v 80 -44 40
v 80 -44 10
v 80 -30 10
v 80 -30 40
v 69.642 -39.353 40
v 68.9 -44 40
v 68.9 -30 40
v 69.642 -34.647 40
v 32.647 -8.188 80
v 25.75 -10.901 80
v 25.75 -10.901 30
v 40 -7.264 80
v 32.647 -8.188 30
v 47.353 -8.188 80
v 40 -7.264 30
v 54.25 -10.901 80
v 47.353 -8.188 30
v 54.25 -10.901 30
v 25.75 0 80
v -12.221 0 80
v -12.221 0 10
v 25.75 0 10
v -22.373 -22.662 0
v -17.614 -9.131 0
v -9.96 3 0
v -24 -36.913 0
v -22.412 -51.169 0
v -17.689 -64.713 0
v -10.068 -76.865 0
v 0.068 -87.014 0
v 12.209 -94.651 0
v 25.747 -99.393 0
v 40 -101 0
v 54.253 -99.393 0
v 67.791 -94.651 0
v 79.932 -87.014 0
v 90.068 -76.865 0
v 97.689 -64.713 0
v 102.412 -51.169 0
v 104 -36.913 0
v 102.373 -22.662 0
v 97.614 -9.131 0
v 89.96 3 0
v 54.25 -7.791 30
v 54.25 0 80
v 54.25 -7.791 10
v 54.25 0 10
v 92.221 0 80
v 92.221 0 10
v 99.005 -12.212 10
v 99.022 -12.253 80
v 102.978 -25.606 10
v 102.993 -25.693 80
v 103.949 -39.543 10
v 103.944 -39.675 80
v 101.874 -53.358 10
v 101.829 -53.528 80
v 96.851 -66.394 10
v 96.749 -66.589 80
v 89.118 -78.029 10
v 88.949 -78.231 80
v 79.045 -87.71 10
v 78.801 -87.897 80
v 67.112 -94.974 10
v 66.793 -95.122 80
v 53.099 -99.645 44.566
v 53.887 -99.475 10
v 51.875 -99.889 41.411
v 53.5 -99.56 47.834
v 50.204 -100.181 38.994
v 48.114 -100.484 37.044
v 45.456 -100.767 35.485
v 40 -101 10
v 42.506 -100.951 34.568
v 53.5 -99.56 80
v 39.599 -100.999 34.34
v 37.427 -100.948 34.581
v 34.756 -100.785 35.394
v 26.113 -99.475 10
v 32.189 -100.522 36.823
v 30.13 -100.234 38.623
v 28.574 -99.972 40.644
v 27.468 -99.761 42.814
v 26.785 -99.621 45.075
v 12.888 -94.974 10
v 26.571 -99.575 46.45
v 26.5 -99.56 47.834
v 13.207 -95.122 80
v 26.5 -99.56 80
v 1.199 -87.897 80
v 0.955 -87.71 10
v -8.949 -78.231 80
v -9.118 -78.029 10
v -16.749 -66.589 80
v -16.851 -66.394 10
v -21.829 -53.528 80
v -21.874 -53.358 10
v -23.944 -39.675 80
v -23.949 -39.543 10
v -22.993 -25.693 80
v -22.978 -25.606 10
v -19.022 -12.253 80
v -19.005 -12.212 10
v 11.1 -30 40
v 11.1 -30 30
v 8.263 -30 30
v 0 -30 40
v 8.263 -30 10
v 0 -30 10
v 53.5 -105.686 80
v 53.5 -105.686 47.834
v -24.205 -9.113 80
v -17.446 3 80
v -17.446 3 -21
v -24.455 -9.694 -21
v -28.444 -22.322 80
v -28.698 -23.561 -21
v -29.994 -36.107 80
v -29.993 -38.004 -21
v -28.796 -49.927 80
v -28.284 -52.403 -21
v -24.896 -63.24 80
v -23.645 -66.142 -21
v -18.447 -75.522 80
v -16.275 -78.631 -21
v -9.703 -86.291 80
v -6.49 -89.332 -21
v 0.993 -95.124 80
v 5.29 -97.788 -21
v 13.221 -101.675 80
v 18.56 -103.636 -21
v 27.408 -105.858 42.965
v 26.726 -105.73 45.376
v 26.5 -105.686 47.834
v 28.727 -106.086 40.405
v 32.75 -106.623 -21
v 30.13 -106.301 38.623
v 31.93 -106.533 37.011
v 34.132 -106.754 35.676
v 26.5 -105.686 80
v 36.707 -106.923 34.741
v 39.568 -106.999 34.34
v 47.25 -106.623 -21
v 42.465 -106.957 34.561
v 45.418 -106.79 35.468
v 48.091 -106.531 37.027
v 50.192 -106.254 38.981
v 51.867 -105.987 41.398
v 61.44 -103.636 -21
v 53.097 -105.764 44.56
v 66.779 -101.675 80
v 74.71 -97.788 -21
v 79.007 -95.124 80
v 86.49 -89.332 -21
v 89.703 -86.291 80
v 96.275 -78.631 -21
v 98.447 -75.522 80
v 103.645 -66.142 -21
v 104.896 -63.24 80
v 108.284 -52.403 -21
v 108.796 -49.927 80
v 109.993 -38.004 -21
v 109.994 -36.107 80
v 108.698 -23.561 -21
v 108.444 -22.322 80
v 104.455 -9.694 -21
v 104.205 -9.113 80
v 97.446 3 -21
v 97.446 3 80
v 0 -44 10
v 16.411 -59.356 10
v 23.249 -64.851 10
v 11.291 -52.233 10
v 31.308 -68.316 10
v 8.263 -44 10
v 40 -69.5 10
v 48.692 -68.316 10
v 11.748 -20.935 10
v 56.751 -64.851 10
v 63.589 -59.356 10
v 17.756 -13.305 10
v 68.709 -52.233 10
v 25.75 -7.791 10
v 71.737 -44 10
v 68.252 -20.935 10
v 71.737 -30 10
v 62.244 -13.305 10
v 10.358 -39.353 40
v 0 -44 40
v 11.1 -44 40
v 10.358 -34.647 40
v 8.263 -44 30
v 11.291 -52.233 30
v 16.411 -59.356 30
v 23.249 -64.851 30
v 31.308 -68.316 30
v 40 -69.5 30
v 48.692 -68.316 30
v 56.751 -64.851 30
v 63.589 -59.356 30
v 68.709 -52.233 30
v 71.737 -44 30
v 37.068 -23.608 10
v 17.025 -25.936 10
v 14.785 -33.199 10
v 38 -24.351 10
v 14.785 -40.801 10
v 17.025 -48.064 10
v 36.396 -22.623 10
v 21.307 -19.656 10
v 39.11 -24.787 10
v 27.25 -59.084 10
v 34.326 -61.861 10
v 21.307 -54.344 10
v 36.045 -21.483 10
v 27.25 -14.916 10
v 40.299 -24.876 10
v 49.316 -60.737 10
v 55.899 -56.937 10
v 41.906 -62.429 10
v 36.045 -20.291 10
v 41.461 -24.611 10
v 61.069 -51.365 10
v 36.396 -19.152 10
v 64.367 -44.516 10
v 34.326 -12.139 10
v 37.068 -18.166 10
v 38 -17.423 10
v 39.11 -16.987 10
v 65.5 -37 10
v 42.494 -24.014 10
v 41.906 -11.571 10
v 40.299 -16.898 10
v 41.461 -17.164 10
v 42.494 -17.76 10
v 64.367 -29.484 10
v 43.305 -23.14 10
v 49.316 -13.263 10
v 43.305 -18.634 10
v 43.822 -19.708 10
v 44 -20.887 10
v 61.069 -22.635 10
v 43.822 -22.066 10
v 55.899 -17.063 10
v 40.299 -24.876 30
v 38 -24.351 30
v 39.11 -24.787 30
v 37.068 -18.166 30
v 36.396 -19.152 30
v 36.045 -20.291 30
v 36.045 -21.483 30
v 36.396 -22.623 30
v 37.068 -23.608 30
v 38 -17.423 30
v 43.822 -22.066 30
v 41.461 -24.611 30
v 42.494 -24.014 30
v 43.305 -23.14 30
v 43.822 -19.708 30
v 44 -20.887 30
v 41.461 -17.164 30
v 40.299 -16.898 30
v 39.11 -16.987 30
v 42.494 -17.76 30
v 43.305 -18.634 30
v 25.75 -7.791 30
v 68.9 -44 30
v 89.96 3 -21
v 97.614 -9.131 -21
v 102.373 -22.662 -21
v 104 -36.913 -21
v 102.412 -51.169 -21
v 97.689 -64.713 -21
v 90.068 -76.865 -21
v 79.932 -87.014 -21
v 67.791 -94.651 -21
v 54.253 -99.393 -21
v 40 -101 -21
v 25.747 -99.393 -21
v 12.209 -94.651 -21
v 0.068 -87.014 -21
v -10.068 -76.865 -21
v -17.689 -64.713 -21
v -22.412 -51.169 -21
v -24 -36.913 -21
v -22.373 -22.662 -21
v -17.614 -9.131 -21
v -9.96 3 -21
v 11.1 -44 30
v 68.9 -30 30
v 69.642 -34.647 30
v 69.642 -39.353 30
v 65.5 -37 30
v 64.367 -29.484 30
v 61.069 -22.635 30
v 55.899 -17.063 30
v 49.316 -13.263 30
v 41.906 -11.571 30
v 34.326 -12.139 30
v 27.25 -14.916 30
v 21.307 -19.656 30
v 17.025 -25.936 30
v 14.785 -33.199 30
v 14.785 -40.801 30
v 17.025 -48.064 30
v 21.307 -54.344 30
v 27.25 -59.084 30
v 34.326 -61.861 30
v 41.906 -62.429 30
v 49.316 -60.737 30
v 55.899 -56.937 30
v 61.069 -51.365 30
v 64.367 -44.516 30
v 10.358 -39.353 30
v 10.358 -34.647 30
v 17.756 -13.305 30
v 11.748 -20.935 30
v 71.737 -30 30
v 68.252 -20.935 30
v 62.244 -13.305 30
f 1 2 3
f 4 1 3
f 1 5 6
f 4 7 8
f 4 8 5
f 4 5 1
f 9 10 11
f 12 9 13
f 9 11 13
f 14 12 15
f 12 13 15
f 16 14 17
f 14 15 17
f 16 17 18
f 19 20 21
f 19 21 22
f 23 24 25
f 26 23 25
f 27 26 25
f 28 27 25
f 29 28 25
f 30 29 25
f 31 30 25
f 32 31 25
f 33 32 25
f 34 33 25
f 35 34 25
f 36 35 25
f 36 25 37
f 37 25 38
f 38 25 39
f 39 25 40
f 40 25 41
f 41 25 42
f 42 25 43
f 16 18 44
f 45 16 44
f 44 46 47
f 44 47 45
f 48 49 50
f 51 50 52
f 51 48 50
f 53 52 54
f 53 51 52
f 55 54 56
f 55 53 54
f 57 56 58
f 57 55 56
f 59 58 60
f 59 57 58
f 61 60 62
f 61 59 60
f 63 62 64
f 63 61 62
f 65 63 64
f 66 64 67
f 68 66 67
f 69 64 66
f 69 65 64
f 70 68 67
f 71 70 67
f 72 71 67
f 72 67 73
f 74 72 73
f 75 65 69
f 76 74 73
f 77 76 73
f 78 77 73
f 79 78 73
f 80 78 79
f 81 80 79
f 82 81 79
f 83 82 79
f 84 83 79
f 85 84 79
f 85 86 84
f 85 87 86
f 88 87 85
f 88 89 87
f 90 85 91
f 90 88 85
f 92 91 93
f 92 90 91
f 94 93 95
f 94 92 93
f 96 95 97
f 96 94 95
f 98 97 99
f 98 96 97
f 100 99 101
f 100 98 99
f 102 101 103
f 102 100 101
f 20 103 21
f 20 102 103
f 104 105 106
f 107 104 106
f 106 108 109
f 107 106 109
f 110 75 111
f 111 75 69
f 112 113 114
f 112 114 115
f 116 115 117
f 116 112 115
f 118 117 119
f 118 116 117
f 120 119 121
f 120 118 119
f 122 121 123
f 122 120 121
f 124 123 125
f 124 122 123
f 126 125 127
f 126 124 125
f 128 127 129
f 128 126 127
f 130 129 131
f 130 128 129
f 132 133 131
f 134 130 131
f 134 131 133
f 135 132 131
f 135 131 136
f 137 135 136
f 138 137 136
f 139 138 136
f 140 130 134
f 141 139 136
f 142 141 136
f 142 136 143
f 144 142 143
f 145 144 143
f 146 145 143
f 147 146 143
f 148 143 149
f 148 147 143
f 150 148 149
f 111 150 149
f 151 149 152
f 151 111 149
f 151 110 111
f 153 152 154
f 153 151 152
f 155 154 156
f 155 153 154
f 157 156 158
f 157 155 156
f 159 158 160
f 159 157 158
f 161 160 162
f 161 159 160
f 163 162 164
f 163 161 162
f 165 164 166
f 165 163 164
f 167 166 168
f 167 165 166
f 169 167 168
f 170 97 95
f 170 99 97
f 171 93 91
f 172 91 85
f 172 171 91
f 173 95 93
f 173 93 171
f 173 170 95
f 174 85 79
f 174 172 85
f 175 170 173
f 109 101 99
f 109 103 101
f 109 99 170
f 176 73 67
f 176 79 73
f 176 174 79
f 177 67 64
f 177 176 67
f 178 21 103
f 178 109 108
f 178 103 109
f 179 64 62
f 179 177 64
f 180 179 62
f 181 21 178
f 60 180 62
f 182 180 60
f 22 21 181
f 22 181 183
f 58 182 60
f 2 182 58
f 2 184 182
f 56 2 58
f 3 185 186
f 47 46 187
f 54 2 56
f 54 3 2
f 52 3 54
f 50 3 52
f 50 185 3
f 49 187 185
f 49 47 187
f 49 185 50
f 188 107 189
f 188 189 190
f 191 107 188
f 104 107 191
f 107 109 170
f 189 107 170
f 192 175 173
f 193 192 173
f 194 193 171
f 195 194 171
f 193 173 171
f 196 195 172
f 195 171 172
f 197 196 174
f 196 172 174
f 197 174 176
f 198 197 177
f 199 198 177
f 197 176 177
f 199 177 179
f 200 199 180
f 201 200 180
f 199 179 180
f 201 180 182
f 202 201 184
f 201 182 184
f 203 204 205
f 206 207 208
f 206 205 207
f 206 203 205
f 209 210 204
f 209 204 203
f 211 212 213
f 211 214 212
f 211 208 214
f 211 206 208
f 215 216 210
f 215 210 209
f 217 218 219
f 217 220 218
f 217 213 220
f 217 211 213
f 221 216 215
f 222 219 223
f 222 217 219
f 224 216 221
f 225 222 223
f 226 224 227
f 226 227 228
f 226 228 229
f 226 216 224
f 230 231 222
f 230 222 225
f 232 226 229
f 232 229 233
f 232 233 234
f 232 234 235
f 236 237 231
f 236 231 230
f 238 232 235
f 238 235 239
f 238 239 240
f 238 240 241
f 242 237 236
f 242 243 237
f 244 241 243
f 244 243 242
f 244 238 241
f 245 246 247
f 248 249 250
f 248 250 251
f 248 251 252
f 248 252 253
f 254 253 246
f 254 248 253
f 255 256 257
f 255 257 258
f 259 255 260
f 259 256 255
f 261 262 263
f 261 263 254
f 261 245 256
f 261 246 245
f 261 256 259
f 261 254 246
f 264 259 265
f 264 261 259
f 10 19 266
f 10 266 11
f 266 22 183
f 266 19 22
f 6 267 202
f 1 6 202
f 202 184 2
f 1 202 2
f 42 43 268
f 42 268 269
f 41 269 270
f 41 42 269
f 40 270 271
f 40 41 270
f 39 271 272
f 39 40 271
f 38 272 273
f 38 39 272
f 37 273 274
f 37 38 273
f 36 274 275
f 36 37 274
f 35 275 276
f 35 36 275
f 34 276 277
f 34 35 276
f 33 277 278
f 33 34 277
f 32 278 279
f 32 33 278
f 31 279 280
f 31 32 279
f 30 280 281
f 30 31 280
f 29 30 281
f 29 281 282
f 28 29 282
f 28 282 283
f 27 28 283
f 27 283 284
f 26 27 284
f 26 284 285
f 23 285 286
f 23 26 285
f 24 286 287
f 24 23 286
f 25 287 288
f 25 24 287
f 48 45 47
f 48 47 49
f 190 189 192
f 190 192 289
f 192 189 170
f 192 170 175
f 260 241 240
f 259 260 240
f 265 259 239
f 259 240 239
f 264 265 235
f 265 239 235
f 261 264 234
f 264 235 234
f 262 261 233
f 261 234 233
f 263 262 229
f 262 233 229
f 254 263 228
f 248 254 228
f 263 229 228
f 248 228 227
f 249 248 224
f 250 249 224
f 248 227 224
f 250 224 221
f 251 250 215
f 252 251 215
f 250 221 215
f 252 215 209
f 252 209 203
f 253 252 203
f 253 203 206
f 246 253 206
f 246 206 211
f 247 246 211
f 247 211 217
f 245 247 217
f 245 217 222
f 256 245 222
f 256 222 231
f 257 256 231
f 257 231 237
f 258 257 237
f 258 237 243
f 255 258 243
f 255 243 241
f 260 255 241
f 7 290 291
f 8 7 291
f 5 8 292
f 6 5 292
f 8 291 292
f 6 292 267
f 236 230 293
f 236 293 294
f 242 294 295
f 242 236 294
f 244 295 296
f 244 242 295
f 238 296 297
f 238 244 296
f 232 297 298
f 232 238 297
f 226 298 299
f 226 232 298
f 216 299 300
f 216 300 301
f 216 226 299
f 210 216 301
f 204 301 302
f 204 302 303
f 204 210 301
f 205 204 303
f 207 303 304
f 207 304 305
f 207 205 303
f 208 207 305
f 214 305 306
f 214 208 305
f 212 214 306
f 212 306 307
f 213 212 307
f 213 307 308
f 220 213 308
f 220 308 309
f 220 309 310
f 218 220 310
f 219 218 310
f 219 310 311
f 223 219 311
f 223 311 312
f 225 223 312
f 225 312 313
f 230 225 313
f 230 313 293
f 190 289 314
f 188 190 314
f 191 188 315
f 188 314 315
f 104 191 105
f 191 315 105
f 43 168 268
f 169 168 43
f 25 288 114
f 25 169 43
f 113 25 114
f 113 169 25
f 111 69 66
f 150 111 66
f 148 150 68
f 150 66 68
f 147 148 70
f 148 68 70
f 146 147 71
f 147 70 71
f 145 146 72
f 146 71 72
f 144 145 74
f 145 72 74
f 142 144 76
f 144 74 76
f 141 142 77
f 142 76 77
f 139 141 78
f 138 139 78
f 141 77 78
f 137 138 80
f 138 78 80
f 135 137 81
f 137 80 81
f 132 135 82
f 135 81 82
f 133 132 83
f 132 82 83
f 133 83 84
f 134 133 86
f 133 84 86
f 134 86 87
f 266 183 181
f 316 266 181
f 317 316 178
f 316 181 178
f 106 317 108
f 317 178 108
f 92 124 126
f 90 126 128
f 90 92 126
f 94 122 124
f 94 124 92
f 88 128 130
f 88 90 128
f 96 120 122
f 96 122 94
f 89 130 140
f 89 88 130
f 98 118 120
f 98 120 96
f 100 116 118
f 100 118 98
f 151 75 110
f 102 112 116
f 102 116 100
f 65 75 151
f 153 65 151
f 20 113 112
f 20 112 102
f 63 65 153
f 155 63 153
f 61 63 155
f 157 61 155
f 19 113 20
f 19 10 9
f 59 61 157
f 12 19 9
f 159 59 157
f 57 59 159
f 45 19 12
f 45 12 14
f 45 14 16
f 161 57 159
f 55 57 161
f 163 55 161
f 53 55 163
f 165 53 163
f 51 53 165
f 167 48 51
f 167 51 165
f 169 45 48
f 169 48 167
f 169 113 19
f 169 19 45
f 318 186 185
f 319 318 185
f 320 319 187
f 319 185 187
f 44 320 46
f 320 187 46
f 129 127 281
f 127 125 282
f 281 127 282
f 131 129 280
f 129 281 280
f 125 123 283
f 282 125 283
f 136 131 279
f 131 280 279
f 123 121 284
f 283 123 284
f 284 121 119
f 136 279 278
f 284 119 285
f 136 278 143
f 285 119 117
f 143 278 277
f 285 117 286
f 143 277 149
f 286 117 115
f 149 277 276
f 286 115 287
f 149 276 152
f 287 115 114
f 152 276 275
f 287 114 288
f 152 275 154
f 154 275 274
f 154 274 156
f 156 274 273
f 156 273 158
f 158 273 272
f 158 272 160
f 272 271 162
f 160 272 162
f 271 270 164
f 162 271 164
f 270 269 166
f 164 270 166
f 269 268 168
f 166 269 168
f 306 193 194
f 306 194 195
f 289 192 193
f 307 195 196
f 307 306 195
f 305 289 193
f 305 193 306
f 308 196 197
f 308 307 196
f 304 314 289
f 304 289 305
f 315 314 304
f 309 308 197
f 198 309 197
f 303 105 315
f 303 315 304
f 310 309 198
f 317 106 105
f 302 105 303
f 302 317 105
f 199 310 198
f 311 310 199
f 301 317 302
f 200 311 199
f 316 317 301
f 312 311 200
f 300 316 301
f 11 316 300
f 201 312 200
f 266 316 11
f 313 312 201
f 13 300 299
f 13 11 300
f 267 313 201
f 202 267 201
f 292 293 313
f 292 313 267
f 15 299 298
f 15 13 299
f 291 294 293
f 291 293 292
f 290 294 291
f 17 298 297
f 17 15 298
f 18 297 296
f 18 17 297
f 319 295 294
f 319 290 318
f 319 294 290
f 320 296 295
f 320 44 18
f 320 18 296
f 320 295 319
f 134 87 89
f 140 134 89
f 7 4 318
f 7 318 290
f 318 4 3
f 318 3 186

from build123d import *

# Parameters (mm, degrees)
BOSS_EXTRUDE1_DEPTH = 21
BOSS_EXTRUDE2_DEPTH = 10
SKETCH1_30_R        = 32.5
SKETCH1_30_R_2      = 25.5
SKETCH1_30_R_3      = 4
BOSS_EXTRUDE3_DEPTH = 30
BOSS_EXTRUDE5_DEPTH = 40
BOSS_EXTRUDE6_DEPTH = 80
BOSS_EXTRUDE7_START = 80
BOSS_EXTRUDE7_DEPTH = 80
CUT_EXTRUDE2_DEPTH  = 99


with BuildPart() as part:
    # Sketch1 → Boss-Extrude1 (new body)
    with BuildSketch(Plane.XY):
        with BuildLine():
            ThreePointArc((89.959983987, 3), (91.112349849, 1.51658984), (92.220685557, 0))
            ThreePointArc((92.220685557, 0), (100.984112175, -17.585107206), (104, -37))
            ThreePointArc((104, -37), (20.585107206, -97.984112175), (-12.220685557, 0))
            ThreePointArc((-12.220685557, 0), (-11.112349849, 1.51658984), (-9.959983987, 3))
            Line((-9.959983987, 3), (-17.445626465, 3))
            ThreePointArc((-17.445626465, 3), (19.038056538, -103.787700412), (110, -37))
            ThreePointArc((110, -37), (106.787700412, -16.038056538), (97.445626465, 3))
            Line((97.445626465, 3), (89.959983987, 3))
        make_face()
    extrude(amount=-BOSS_EXTRUDE1_DEPTH)



with BuildPart() as body_2:
    # Sketch1<29> → Boss-Extrude2 (new body)
    with BuildSketch(Plane.XY):
        with BuildLine():
            Line((89.959983987, 3), (-9.959983987, 3))
            ThreePointArc((-9.959983987, 3), (40, -101), (89.959983987, 3))
        make_face()
    extrude(amount=BOSS_EXTRUDE2_DEPTH)

    # Sketch1<30> → Boss-Extrude3 (add)
    # profile 1 of 2: a face of its own
    with BuildSketch(Plane.XY):
        with Locations((40, -37)):
            Circle(SKETCH1_30_R)
        with Locations((40, -37)):
            Circle(SKETCH1_30_R_2, mode=Mode.SUBTRACT)
    # profile 2 of 2: a face of its own
    with BuildSketch(Plane.XY):
        with Locations((40, -20.887152182)):
            Circle(SKETCH1_30_R_3)
    extrude(amount=BOSS_EXTRUDE3_DEPTH)

    # Sketch1<33> → Boss-Extrude5 (add)
    with BuildSketch(Plane.XY):
        with BuildLine():
            Line((80, -44), (80, -30))
            Line((80, -30), (68.9, -30))
            ThreePointArc((68.9, -30), (69.735668817, -37), (68.9, -44))
            Line((68.9, -44), (80, -44))
        make_face()
        with BuildLine():
            Line((0, -44), (11.1, -44))
            ThreePointArc((11.1, -44), (10.264331183, -37), (11.1, -30))
            Line((11.1, -30), (0, -30))
            Line((0, -30), (0, -44))
        make_face()
    extrude(amount=BOSS_EXTRUDE5_DEPTH)

    # Sketch1<34> → Boss-Extrude6 (add)
    with BuildSketch(Plane.XY):
        with BuildLine():
            Line((54.25, 0), (25.75, 0))
            Line((25.75, 0), (25.75, -10.901197345))
            ThreePointArc((25.75, -10.901197345), (40, -7.264331183), (54.25, -10.901197345))
            Line((54.25, -10.901197345), (54.25, 0))
        make_face()
    extrude(amount=BOSS_EXTRUDE6_DEPTH)


with BuildPart() as part_1:
    add(part.part)

    add(body_2.part)  # Boss-Extrude7 merges body 2
    # Sketch1<35> → Boss-Extrude7 (add)
    with BuildSketch(Plane.XY.offset(BOSS_EXTRUDE7_START)):
        with BuildLine():
            ThreePointArc((-17.445626465, 3), (40, -107), (97.445626465, 3))
            Line((97.445626465, 3), (-17.445626465, 3))
        make_face()
        with BuildLine():
            ThreePointArc((92.220685557, 0), (40, -101), (-12.220685557, 0))
            Line((-12.220685557, 0), (92.220685557, 0))
        make_face(mode=Mode.SUBTRACT)
    extrude(amount=-BOSS_EXTRUDE7_DEPTH)

    # Sketch4 → Cut-Extrude2 (cut)
    with BuildSketch(Plane(origin=(0, -60, 0), x_dir=(-1, 0, 0), z_dir=(0, -1, 0))):
        with BuildLine():
            Line((-53.5, -80), (-53.5, -47.833564603))
            ThreePointArc((-53.5, -47.833564603), (-40, -34.333564603), (-26.5, -47.833564603))
            Line((-26.5, -47.833564603), (-26.5, -80))
            ThreePointArc((-26.5, -80), (-40, -93.5), (-53.5, -80))
        make_face()
    extrude(amount=CUT_EXTRUDE2_DEPTH, mode=Mode.SUBTRACT)


solid = part_1.part
